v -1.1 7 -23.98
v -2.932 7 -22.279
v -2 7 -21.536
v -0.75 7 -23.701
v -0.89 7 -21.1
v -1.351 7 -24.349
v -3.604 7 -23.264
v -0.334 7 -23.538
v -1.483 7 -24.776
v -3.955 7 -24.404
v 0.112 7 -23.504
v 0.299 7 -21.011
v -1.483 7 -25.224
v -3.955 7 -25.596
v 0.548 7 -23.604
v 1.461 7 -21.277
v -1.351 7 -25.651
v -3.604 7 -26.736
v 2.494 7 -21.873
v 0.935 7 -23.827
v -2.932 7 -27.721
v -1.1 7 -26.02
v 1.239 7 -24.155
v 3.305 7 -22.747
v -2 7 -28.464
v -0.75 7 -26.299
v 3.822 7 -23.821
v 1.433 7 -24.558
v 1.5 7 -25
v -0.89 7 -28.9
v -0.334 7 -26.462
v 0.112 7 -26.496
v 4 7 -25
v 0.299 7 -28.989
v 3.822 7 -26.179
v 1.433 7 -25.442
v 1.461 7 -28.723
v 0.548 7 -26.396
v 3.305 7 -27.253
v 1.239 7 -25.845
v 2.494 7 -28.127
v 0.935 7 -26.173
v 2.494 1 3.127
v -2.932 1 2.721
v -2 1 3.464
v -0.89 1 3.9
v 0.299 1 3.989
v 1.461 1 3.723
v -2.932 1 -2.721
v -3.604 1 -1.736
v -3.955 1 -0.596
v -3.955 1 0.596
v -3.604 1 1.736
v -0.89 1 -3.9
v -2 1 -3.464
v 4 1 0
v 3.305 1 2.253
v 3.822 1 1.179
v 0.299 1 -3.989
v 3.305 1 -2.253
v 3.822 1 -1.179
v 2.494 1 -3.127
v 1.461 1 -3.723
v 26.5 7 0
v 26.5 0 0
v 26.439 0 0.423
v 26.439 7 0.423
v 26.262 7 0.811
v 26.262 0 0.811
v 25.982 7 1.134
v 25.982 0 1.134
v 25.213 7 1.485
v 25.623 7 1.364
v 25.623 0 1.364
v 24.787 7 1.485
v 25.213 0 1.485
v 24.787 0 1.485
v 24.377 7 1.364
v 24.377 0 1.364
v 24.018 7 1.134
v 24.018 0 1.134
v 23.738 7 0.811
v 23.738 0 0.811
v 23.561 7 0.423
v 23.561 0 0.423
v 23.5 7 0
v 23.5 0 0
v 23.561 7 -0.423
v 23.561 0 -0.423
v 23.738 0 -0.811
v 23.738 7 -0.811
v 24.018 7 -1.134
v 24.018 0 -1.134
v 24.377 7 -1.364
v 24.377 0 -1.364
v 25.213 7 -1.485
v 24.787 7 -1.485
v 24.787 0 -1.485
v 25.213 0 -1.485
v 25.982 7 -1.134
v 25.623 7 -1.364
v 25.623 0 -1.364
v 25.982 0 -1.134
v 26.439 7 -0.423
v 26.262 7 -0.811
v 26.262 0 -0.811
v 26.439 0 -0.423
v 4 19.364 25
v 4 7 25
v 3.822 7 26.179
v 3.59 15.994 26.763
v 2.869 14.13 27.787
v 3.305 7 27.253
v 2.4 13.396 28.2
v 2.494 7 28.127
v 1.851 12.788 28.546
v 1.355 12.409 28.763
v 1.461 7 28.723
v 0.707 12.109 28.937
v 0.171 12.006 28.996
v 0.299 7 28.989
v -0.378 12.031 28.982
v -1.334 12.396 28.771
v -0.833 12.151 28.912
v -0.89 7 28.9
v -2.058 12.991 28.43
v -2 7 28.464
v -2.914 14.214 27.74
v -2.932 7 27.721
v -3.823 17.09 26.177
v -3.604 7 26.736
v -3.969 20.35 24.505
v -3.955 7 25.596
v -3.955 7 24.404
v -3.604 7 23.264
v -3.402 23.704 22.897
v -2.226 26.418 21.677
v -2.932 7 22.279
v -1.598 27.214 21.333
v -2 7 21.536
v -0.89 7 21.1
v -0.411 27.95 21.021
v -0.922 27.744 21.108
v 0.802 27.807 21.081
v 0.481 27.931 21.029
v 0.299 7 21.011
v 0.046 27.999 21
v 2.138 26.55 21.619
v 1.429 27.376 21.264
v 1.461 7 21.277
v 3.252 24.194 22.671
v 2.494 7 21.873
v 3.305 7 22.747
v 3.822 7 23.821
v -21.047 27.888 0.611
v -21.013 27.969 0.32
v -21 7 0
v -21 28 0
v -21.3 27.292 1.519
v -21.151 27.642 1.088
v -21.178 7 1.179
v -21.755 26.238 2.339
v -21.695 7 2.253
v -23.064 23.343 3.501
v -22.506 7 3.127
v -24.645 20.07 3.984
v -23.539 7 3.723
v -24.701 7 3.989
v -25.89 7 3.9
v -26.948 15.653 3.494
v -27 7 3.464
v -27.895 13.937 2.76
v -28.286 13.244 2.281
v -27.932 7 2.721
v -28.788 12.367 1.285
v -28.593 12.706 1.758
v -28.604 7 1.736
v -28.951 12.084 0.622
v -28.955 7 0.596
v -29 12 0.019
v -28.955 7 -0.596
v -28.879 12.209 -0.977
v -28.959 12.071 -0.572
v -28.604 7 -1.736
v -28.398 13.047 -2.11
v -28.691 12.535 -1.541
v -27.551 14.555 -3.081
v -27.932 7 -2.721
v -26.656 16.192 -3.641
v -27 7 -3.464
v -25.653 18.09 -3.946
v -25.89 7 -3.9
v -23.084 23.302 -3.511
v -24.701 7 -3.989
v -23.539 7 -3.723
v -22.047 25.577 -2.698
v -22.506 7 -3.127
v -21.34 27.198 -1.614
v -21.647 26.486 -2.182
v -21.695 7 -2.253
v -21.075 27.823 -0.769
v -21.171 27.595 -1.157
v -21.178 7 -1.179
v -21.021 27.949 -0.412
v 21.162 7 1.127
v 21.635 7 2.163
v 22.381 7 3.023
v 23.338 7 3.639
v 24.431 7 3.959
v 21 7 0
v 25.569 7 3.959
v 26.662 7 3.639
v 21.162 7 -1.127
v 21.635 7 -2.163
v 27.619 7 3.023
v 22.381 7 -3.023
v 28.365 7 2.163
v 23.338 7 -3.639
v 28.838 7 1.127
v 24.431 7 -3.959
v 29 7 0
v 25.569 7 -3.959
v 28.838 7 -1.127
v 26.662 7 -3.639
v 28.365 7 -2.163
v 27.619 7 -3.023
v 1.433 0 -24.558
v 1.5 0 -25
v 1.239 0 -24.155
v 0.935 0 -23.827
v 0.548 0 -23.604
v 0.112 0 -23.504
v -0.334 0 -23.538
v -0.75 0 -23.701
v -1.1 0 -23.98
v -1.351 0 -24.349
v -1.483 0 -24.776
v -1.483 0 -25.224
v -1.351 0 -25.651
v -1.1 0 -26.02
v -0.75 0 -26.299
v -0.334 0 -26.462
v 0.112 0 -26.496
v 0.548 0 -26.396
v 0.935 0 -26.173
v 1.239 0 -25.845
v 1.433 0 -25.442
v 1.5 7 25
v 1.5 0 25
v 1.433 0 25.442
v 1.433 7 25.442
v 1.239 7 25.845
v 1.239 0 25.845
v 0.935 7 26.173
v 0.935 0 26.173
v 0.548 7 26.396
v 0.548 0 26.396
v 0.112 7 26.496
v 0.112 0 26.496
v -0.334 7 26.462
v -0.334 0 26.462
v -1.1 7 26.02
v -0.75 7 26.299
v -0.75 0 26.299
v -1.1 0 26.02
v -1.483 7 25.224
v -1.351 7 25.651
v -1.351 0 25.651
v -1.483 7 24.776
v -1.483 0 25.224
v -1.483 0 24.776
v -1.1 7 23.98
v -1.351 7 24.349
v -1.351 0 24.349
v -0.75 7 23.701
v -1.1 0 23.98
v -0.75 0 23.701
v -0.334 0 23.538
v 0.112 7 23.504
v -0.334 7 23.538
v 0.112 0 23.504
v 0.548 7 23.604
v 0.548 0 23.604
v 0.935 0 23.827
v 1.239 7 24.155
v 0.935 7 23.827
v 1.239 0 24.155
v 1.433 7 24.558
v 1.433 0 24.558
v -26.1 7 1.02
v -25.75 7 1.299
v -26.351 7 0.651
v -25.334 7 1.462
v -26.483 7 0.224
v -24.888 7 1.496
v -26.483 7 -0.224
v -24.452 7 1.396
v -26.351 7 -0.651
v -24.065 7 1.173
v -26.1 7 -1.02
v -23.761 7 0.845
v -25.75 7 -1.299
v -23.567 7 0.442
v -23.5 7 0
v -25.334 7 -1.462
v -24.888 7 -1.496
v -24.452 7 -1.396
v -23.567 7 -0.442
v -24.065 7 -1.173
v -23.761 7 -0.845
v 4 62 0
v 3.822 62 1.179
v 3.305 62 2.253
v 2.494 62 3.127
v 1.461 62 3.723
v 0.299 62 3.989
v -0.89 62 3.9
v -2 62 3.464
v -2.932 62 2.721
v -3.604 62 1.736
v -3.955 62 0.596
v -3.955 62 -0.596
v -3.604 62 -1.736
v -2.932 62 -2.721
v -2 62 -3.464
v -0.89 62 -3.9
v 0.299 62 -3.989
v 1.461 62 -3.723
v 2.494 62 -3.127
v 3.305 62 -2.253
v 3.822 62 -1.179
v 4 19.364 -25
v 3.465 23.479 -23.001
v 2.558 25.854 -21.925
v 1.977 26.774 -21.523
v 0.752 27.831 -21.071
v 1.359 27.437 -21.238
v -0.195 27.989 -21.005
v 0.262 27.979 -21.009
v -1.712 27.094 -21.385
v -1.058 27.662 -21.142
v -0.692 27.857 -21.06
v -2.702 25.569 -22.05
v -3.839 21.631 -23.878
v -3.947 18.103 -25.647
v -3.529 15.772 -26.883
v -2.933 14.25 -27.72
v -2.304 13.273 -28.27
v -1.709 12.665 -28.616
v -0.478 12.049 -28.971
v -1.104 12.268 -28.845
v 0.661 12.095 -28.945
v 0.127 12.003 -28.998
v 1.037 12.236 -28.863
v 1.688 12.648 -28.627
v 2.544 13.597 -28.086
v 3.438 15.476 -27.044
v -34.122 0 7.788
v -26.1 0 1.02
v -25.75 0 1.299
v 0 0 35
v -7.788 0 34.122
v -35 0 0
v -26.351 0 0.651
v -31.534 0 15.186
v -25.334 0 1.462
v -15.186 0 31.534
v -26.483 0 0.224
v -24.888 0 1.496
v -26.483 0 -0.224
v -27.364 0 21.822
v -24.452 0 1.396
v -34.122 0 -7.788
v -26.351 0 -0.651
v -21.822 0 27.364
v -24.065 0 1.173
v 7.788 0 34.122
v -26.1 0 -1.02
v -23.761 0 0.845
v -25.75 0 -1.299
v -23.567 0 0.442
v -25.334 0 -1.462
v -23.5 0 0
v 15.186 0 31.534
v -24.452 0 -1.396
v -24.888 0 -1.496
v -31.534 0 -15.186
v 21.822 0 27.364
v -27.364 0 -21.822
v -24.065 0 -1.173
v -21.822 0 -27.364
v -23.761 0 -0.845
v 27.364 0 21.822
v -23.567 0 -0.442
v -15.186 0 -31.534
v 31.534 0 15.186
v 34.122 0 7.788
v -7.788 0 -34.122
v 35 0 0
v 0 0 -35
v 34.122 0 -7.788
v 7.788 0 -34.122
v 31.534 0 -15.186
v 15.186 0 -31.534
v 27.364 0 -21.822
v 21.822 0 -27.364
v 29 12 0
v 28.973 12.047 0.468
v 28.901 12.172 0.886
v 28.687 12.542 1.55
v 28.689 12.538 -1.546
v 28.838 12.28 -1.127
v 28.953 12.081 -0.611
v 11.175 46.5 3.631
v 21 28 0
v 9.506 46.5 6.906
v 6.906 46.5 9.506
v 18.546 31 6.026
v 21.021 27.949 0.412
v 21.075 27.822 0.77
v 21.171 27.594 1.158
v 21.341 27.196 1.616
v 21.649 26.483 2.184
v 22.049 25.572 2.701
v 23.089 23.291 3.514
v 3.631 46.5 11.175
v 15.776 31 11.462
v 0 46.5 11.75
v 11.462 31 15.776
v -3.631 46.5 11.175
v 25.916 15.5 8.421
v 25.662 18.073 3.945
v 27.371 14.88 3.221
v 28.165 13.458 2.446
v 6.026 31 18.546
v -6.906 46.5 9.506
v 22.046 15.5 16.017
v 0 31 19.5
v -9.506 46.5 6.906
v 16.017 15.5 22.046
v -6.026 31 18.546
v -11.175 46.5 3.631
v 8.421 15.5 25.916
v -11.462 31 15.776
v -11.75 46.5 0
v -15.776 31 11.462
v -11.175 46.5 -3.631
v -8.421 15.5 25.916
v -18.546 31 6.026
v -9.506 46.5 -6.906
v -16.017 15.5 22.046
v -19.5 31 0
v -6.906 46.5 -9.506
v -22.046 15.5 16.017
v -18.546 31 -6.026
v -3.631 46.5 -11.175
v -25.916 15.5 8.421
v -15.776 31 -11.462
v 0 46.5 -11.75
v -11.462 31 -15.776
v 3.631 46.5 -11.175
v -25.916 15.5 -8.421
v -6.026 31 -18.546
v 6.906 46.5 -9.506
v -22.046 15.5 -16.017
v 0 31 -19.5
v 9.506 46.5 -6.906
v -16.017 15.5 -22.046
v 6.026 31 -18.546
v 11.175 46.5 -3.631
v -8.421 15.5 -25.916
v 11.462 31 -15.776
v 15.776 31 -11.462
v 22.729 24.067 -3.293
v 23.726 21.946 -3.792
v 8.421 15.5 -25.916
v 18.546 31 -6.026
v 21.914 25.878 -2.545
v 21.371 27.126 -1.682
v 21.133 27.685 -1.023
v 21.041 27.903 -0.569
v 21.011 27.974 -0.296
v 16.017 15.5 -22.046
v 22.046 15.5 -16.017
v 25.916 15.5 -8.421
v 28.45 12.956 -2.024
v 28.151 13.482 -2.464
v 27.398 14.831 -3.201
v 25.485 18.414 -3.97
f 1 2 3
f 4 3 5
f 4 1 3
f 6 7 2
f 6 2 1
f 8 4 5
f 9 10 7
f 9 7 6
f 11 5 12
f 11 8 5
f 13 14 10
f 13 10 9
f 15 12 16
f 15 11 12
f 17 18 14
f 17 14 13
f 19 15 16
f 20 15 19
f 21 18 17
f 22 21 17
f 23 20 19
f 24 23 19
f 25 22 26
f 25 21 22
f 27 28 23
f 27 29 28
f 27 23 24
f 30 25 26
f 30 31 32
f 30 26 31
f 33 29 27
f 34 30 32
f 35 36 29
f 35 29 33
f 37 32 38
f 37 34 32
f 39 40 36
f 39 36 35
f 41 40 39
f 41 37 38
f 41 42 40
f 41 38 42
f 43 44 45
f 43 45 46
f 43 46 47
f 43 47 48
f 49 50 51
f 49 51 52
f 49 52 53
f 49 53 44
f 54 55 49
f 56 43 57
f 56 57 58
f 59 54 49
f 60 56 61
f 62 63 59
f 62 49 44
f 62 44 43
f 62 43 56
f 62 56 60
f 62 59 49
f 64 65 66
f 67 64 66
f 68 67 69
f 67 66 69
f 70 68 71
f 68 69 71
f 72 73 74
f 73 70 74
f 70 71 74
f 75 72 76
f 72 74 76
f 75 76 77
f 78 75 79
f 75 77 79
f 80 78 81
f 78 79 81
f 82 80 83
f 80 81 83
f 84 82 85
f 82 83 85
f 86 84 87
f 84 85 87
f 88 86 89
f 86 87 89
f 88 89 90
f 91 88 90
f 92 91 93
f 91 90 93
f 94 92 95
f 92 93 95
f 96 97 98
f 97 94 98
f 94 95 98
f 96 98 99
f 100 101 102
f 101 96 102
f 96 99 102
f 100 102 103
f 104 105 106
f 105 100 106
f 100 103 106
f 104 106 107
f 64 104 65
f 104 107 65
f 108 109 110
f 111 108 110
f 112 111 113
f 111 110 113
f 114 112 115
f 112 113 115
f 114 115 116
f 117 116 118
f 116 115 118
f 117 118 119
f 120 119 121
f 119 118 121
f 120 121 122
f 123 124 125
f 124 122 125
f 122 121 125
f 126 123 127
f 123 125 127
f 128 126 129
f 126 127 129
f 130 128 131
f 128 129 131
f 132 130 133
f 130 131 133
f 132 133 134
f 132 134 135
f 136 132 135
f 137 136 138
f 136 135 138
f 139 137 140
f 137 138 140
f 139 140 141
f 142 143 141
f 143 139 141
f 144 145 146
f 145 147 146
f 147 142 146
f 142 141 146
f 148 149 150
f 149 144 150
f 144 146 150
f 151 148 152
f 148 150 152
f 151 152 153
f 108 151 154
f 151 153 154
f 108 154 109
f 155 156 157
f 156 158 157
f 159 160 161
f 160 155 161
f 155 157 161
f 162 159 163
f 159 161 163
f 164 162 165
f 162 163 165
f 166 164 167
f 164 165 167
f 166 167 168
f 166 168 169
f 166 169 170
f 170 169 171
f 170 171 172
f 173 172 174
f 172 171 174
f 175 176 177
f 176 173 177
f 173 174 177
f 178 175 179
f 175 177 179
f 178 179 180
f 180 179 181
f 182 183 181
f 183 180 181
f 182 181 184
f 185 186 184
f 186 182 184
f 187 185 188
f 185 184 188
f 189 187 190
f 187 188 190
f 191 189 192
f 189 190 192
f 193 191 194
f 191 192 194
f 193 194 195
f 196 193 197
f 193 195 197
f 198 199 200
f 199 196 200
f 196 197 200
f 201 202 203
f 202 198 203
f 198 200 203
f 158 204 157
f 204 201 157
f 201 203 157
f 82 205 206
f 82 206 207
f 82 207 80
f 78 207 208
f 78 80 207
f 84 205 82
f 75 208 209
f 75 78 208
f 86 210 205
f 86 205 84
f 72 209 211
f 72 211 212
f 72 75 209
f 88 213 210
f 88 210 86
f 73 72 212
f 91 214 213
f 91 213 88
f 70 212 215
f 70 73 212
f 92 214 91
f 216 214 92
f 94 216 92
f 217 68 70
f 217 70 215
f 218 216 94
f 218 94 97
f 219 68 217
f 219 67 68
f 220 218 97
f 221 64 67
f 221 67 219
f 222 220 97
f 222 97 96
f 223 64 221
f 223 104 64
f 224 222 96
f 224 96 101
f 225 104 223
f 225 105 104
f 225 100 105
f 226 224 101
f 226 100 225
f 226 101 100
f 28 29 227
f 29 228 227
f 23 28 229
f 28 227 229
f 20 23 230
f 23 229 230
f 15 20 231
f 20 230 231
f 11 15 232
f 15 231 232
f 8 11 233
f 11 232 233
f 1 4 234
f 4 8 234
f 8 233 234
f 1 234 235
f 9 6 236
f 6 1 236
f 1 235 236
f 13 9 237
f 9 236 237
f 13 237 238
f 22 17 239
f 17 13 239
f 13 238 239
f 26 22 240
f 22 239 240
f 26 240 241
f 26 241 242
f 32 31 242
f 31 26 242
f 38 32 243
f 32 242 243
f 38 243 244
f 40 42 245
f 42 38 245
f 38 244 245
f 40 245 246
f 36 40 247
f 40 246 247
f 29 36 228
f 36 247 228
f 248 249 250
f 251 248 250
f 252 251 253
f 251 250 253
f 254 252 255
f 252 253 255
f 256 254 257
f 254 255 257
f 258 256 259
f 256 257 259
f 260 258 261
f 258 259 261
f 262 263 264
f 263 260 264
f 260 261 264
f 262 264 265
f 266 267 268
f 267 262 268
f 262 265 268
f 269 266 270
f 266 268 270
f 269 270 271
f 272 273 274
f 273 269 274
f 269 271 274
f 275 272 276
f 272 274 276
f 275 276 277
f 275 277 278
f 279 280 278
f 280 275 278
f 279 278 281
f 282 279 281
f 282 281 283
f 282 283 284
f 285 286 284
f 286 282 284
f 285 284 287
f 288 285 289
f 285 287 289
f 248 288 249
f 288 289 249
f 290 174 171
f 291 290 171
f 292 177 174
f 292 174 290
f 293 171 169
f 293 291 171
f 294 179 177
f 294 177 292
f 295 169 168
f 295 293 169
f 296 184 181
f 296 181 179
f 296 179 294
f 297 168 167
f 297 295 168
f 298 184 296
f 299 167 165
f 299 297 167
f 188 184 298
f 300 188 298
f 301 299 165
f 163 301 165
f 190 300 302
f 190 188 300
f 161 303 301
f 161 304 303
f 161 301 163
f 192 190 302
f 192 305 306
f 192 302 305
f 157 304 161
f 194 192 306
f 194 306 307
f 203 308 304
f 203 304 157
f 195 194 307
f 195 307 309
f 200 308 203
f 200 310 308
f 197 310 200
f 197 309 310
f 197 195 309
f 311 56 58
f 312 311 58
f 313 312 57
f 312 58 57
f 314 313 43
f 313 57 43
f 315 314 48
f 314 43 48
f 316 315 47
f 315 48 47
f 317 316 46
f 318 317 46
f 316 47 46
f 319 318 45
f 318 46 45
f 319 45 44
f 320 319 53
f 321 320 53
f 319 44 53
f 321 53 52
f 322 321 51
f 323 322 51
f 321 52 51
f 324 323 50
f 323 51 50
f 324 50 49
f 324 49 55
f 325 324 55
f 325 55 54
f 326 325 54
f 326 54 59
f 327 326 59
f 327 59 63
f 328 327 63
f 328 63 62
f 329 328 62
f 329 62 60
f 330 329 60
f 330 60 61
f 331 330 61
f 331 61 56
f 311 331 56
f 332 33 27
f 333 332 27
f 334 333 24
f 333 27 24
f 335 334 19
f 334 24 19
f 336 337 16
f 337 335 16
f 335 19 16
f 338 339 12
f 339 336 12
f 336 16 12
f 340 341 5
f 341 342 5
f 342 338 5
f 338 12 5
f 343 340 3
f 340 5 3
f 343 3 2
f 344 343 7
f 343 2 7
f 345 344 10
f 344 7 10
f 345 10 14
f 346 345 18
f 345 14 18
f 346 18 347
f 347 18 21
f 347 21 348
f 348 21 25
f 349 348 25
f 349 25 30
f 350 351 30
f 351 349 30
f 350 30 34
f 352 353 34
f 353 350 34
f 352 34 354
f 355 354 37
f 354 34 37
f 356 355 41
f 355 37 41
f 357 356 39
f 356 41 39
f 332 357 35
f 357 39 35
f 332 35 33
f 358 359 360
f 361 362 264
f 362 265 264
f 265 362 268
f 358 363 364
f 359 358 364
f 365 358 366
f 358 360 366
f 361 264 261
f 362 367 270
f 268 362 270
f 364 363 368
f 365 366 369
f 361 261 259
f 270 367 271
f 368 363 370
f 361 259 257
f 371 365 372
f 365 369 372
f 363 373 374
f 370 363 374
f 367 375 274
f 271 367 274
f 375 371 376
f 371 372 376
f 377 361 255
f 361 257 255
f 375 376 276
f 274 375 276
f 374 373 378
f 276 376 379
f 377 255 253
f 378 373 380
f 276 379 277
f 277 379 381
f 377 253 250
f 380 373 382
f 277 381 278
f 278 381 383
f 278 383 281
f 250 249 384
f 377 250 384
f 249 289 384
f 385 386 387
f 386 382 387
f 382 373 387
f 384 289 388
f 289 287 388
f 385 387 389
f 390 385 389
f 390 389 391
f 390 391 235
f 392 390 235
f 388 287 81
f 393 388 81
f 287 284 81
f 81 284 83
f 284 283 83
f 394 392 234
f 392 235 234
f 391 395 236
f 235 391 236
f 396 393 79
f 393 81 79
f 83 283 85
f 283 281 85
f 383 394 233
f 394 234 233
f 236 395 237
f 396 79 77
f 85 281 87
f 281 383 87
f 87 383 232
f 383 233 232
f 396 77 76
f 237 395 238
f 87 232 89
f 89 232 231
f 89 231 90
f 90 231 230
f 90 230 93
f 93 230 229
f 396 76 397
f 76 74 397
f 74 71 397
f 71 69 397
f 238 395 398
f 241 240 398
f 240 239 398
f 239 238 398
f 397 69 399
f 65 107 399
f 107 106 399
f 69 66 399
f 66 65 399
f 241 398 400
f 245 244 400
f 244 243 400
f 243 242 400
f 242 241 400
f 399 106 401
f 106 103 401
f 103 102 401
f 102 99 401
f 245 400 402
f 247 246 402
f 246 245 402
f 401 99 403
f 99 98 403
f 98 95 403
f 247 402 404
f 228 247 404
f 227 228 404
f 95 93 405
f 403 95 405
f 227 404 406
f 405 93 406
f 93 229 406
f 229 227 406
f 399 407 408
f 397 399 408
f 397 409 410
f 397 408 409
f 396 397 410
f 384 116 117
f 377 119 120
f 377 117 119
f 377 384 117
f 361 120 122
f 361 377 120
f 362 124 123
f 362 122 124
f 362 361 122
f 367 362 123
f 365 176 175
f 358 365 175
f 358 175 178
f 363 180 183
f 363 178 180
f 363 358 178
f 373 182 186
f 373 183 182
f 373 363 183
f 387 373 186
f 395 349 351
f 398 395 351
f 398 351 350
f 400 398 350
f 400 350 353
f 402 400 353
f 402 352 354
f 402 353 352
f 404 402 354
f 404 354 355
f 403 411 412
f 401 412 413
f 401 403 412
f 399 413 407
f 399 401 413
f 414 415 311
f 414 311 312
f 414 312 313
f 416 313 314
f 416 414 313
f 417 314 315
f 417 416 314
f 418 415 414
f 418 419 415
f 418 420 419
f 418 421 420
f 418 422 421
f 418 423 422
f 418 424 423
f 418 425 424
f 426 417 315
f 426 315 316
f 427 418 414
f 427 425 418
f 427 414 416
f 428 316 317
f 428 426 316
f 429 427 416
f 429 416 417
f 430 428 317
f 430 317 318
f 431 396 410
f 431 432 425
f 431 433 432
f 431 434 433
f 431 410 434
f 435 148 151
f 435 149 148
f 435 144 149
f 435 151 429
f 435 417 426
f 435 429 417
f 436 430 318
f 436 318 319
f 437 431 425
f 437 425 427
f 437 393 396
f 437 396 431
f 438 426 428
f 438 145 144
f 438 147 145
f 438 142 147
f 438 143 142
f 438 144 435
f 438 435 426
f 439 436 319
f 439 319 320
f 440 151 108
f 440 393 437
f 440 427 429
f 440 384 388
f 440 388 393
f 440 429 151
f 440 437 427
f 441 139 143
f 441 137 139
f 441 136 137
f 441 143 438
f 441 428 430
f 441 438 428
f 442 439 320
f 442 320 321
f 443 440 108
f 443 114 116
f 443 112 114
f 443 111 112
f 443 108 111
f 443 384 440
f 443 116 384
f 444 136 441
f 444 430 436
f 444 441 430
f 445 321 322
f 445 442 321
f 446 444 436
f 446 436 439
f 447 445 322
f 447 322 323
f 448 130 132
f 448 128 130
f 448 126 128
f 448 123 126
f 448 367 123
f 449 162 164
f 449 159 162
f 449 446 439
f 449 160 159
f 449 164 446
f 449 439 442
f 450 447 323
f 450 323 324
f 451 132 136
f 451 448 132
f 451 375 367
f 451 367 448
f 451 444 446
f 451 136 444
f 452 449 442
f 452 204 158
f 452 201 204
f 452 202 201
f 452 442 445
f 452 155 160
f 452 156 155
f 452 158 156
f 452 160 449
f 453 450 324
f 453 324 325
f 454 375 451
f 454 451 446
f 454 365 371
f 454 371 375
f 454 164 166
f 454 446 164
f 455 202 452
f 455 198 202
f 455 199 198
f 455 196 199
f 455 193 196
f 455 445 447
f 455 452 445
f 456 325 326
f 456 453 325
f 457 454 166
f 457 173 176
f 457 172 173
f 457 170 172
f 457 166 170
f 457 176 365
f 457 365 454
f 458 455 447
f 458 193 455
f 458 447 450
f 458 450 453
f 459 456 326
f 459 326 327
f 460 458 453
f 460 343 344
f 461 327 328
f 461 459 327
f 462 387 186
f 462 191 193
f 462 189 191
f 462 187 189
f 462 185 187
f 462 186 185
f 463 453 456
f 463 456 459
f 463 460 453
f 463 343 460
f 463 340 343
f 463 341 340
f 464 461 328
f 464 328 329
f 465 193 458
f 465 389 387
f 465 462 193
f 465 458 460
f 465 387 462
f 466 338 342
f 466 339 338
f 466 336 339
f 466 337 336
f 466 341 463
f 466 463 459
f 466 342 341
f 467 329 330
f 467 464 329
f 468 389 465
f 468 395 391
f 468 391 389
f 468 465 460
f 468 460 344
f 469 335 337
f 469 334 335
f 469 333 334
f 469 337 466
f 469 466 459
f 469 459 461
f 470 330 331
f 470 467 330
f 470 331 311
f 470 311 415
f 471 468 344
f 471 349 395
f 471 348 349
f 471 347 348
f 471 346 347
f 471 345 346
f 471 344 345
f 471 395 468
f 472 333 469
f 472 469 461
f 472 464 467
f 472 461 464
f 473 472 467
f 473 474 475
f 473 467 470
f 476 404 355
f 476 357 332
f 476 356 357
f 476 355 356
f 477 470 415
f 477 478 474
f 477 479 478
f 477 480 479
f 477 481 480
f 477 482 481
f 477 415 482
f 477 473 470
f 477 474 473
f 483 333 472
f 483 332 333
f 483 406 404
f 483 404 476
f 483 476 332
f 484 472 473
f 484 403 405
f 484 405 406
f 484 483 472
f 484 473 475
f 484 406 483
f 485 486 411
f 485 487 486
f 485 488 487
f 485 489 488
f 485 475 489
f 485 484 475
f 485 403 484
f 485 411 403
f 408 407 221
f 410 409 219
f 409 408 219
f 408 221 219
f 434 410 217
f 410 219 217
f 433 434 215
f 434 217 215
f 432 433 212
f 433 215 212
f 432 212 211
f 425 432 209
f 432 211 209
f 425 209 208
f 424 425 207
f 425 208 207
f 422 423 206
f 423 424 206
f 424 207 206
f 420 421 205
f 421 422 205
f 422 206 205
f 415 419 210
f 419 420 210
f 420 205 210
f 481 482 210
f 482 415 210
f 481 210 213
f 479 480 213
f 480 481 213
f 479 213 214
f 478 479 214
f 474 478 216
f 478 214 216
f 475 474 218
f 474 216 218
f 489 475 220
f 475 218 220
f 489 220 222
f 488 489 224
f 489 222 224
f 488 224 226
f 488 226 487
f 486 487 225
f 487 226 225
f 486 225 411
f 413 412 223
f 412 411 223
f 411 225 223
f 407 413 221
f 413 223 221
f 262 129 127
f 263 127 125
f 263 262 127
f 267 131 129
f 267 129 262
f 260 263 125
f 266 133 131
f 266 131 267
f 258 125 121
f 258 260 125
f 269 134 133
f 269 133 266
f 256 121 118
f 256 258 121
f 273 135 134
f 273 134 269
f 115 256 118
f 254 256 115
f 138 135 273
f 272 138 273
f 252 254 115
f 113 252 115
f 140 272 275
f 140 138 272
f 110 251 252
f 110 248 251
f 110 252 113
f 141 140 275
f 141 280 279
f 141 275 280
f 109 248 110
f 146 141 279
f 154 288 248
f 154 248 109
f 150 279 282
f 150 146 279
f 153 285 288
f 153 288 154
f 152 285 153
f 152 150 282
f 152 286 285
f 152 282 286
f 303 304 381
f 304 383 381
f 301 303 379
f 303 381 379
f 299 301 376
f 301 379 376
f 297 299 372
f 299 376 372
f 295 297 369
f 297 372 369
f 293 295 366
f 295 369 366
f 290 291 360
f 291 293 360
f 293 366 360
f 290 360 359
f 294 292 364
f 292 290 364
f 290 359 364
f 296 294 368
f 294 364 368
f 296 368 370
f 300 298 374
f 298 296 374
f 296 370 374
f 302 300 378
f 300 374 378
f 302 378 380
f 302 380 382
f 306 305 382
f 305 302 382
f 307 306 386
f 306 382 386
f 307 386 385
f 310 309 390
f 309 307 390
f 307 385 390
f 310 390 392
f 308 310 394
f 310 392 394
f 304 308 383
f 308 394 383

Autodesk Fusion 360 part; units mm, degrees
sketch "Sketch1" plane through (0, 0, 0) normal (0, 1, 0) x (1, 0, 0)
  circle A0 centre (0, 0) radius 35
  circle A1 centre (25, 0) radius 1.5
  line L0 (0, 0) -> (25, 0)
  circle A2 centre (0, 25) radius 1.5
  circle A3 centre (-25, 0) radius 1.5
  circle A4 centre (0, -25) radius 1.5
  circle A5 centre (0, 0) radius 4
  circle A6 centre (-25, 0) radius 4
  circle A7 centre (0, 25) radius 4
  circle A8 centre (25, 0) radius 4
  circle A9 centre (0, -25) radius 4
  dimension "d1" = 70
  dimension "d2" = 3
  dimension "d3" = 25
  dimension "d5" = 360
  dimension "d6" = 8
  dimension "d21" = 8
  dimension "d22" = 8
  dimension "d23" = 8
  dimension "d24" = 8
sketch "Sketch3" plane through (0, 0, 0) normal (0, 0, 1) x (1, 0, 0)
  line L0 (0, 0) -> (0, 70)
  line L1 (0, 0) -> (35, 0)
  line L2 (35, 0) -> (0, 70)
  dimension "d18" = 70
  dimension "d19" = 35
revolve "Revolve1" add sketch "Sketch3" angle 360 about axis through (0, 0, 0) along (0, 1, 0)
extrude "Extrude4" add sketch "Sketch1" along normal blind 7 contours A5
extrude "Extrude6" cut sketch "Sketch1" along normal blind 30 contours A1 | A8 | A2 | A3 | A4 | A6 | A7 | A9
extrude "Extrude7" add sketch "Sketch1" along normal blind 7 contours A8 | A6 | A7 | A9
extrude "Extrude8" cut sketch "Sketch1" along normal blind 70 contours A5
extrude "Extrude9" add sketch "Sketch1" along normal blind 1 contours A5
sketch "Sketch4" plane through (0, 0, 0) normal (0, 0, 1) x (1, 0, 0)
